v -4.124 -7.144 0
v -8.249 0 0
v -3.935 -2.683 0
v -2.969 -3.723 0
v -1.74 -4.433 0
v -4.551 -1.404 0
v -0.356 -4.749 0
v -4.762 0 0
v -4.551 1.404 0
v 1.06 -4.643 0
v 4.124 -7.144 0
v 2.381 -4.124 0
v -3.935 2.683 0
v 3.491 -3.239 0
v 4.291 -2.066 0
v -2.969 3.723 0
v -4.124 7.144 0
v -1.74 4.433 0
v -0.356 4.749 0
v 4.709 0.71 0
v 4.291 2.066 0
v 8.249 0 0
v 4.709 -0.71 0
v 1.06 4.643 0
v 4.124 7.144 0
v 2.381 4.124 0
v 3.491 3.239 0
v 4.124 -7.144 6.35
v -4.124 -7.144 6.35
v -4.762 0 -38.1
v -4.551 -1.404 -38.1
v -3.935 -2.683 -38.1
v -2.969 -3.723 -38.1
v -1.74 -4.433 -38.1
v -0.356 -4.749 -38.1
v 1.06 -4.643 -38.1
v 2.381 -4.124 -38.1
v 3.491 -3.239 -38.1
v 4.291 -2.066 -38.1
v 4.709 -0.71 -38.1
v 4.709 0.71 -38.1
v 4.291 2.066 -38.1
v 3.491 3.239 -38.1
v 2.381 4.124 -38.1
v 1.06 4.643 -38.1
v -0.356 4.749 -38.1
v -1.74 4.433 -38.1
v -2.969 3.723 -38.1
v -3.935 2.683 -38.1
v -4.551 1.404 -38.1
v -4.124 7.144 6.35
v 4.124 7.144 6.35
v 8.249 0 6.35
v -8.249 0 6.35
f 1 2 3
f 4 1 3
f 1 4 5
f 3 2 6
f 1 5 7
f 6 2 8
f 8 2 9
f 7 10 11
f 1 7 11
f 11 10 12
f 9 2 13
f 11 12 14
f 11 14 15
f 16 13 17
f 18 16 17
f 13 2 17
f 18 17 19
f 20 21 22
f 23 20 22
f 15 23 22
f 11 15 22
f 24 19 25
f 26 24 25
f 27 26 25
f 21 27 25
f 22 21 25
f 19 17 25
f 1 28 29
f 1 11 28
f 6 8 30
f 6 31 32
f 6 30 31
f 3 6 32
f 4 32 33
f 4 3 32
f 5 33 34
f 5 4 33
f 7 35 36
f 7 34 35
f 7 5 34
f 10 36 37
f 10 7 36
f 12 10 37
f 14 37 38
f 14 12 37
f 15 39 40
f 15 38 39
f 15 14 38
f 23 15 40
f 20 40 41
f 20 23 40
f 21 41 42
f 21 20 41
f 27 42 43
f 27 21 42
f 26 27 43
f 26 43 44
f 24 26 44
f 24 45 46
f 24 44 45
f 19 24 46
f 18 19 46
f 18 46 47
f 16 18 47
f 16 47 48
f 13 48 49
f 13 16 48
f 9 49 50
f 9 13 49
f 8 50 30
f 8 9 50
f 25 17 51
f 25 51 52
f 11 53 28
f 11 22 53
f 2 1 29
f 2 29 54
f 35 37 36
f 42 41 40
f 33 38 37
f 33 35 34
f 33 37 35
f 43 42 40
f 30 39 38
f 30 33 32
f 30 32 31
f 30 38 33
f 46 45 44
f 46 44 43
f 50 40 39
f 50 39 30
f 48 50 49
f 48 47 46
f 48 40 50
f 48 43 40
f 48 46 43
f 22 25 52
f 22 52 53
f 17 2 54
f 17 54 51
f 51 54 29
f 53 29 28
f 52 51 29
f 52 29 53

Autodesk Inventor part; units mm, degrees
ref_plane "YZ Plane" through (0, 0, 0) normal (1, 0, 0) x (0, 1, 0)
ref_plane "XZ Plane" through (0, 0, 0) normal (0, 1, 0) x (-1, 0, 0)
ref_plane "XY Plane" through (0, 0, 0) normal (0, 0, 1) x (1, 0, 0)
sketch "Sketch1" plane through (0, 0, 0) normal (0, 0, 1) x (1, 0, 0)
  line L0 (4.1244, 7.1437) -> (8.2489, 0)
  line L1 (8.2489, 0) -> (4.1244, -7.1438)
  line L2 (4.1244, -7.1438) -> (-4.1244, -7.1437)
  line L3 (-4.1244, -7.1437) -> (-8.2489, 0)
  line L4 (-8.2489, 0) -> (-4.1244, 7.1437)
  line L5 (-4.1244, 7.1437) -> (4.1244, 7.1437)
  point P0 (0, 0)
  point P1 (0, 0)
  dimension "d0" = 14.2875
extrude "Extrusion1" add sketch "Sketch1" along normal blind 6.35
sketch "Sketch2" plane through (0, 0, 0) normal (0, 0, -1) x (-1, 0, 0)
  circle A0 centre (0, 0) radius 4.7625
  dimension "d3" = 9.525
extrude "Extrusion2" add sketch "Sketch2" along normal blind 38.1
properties part number "bolt" material "Steel, Galvanized"
